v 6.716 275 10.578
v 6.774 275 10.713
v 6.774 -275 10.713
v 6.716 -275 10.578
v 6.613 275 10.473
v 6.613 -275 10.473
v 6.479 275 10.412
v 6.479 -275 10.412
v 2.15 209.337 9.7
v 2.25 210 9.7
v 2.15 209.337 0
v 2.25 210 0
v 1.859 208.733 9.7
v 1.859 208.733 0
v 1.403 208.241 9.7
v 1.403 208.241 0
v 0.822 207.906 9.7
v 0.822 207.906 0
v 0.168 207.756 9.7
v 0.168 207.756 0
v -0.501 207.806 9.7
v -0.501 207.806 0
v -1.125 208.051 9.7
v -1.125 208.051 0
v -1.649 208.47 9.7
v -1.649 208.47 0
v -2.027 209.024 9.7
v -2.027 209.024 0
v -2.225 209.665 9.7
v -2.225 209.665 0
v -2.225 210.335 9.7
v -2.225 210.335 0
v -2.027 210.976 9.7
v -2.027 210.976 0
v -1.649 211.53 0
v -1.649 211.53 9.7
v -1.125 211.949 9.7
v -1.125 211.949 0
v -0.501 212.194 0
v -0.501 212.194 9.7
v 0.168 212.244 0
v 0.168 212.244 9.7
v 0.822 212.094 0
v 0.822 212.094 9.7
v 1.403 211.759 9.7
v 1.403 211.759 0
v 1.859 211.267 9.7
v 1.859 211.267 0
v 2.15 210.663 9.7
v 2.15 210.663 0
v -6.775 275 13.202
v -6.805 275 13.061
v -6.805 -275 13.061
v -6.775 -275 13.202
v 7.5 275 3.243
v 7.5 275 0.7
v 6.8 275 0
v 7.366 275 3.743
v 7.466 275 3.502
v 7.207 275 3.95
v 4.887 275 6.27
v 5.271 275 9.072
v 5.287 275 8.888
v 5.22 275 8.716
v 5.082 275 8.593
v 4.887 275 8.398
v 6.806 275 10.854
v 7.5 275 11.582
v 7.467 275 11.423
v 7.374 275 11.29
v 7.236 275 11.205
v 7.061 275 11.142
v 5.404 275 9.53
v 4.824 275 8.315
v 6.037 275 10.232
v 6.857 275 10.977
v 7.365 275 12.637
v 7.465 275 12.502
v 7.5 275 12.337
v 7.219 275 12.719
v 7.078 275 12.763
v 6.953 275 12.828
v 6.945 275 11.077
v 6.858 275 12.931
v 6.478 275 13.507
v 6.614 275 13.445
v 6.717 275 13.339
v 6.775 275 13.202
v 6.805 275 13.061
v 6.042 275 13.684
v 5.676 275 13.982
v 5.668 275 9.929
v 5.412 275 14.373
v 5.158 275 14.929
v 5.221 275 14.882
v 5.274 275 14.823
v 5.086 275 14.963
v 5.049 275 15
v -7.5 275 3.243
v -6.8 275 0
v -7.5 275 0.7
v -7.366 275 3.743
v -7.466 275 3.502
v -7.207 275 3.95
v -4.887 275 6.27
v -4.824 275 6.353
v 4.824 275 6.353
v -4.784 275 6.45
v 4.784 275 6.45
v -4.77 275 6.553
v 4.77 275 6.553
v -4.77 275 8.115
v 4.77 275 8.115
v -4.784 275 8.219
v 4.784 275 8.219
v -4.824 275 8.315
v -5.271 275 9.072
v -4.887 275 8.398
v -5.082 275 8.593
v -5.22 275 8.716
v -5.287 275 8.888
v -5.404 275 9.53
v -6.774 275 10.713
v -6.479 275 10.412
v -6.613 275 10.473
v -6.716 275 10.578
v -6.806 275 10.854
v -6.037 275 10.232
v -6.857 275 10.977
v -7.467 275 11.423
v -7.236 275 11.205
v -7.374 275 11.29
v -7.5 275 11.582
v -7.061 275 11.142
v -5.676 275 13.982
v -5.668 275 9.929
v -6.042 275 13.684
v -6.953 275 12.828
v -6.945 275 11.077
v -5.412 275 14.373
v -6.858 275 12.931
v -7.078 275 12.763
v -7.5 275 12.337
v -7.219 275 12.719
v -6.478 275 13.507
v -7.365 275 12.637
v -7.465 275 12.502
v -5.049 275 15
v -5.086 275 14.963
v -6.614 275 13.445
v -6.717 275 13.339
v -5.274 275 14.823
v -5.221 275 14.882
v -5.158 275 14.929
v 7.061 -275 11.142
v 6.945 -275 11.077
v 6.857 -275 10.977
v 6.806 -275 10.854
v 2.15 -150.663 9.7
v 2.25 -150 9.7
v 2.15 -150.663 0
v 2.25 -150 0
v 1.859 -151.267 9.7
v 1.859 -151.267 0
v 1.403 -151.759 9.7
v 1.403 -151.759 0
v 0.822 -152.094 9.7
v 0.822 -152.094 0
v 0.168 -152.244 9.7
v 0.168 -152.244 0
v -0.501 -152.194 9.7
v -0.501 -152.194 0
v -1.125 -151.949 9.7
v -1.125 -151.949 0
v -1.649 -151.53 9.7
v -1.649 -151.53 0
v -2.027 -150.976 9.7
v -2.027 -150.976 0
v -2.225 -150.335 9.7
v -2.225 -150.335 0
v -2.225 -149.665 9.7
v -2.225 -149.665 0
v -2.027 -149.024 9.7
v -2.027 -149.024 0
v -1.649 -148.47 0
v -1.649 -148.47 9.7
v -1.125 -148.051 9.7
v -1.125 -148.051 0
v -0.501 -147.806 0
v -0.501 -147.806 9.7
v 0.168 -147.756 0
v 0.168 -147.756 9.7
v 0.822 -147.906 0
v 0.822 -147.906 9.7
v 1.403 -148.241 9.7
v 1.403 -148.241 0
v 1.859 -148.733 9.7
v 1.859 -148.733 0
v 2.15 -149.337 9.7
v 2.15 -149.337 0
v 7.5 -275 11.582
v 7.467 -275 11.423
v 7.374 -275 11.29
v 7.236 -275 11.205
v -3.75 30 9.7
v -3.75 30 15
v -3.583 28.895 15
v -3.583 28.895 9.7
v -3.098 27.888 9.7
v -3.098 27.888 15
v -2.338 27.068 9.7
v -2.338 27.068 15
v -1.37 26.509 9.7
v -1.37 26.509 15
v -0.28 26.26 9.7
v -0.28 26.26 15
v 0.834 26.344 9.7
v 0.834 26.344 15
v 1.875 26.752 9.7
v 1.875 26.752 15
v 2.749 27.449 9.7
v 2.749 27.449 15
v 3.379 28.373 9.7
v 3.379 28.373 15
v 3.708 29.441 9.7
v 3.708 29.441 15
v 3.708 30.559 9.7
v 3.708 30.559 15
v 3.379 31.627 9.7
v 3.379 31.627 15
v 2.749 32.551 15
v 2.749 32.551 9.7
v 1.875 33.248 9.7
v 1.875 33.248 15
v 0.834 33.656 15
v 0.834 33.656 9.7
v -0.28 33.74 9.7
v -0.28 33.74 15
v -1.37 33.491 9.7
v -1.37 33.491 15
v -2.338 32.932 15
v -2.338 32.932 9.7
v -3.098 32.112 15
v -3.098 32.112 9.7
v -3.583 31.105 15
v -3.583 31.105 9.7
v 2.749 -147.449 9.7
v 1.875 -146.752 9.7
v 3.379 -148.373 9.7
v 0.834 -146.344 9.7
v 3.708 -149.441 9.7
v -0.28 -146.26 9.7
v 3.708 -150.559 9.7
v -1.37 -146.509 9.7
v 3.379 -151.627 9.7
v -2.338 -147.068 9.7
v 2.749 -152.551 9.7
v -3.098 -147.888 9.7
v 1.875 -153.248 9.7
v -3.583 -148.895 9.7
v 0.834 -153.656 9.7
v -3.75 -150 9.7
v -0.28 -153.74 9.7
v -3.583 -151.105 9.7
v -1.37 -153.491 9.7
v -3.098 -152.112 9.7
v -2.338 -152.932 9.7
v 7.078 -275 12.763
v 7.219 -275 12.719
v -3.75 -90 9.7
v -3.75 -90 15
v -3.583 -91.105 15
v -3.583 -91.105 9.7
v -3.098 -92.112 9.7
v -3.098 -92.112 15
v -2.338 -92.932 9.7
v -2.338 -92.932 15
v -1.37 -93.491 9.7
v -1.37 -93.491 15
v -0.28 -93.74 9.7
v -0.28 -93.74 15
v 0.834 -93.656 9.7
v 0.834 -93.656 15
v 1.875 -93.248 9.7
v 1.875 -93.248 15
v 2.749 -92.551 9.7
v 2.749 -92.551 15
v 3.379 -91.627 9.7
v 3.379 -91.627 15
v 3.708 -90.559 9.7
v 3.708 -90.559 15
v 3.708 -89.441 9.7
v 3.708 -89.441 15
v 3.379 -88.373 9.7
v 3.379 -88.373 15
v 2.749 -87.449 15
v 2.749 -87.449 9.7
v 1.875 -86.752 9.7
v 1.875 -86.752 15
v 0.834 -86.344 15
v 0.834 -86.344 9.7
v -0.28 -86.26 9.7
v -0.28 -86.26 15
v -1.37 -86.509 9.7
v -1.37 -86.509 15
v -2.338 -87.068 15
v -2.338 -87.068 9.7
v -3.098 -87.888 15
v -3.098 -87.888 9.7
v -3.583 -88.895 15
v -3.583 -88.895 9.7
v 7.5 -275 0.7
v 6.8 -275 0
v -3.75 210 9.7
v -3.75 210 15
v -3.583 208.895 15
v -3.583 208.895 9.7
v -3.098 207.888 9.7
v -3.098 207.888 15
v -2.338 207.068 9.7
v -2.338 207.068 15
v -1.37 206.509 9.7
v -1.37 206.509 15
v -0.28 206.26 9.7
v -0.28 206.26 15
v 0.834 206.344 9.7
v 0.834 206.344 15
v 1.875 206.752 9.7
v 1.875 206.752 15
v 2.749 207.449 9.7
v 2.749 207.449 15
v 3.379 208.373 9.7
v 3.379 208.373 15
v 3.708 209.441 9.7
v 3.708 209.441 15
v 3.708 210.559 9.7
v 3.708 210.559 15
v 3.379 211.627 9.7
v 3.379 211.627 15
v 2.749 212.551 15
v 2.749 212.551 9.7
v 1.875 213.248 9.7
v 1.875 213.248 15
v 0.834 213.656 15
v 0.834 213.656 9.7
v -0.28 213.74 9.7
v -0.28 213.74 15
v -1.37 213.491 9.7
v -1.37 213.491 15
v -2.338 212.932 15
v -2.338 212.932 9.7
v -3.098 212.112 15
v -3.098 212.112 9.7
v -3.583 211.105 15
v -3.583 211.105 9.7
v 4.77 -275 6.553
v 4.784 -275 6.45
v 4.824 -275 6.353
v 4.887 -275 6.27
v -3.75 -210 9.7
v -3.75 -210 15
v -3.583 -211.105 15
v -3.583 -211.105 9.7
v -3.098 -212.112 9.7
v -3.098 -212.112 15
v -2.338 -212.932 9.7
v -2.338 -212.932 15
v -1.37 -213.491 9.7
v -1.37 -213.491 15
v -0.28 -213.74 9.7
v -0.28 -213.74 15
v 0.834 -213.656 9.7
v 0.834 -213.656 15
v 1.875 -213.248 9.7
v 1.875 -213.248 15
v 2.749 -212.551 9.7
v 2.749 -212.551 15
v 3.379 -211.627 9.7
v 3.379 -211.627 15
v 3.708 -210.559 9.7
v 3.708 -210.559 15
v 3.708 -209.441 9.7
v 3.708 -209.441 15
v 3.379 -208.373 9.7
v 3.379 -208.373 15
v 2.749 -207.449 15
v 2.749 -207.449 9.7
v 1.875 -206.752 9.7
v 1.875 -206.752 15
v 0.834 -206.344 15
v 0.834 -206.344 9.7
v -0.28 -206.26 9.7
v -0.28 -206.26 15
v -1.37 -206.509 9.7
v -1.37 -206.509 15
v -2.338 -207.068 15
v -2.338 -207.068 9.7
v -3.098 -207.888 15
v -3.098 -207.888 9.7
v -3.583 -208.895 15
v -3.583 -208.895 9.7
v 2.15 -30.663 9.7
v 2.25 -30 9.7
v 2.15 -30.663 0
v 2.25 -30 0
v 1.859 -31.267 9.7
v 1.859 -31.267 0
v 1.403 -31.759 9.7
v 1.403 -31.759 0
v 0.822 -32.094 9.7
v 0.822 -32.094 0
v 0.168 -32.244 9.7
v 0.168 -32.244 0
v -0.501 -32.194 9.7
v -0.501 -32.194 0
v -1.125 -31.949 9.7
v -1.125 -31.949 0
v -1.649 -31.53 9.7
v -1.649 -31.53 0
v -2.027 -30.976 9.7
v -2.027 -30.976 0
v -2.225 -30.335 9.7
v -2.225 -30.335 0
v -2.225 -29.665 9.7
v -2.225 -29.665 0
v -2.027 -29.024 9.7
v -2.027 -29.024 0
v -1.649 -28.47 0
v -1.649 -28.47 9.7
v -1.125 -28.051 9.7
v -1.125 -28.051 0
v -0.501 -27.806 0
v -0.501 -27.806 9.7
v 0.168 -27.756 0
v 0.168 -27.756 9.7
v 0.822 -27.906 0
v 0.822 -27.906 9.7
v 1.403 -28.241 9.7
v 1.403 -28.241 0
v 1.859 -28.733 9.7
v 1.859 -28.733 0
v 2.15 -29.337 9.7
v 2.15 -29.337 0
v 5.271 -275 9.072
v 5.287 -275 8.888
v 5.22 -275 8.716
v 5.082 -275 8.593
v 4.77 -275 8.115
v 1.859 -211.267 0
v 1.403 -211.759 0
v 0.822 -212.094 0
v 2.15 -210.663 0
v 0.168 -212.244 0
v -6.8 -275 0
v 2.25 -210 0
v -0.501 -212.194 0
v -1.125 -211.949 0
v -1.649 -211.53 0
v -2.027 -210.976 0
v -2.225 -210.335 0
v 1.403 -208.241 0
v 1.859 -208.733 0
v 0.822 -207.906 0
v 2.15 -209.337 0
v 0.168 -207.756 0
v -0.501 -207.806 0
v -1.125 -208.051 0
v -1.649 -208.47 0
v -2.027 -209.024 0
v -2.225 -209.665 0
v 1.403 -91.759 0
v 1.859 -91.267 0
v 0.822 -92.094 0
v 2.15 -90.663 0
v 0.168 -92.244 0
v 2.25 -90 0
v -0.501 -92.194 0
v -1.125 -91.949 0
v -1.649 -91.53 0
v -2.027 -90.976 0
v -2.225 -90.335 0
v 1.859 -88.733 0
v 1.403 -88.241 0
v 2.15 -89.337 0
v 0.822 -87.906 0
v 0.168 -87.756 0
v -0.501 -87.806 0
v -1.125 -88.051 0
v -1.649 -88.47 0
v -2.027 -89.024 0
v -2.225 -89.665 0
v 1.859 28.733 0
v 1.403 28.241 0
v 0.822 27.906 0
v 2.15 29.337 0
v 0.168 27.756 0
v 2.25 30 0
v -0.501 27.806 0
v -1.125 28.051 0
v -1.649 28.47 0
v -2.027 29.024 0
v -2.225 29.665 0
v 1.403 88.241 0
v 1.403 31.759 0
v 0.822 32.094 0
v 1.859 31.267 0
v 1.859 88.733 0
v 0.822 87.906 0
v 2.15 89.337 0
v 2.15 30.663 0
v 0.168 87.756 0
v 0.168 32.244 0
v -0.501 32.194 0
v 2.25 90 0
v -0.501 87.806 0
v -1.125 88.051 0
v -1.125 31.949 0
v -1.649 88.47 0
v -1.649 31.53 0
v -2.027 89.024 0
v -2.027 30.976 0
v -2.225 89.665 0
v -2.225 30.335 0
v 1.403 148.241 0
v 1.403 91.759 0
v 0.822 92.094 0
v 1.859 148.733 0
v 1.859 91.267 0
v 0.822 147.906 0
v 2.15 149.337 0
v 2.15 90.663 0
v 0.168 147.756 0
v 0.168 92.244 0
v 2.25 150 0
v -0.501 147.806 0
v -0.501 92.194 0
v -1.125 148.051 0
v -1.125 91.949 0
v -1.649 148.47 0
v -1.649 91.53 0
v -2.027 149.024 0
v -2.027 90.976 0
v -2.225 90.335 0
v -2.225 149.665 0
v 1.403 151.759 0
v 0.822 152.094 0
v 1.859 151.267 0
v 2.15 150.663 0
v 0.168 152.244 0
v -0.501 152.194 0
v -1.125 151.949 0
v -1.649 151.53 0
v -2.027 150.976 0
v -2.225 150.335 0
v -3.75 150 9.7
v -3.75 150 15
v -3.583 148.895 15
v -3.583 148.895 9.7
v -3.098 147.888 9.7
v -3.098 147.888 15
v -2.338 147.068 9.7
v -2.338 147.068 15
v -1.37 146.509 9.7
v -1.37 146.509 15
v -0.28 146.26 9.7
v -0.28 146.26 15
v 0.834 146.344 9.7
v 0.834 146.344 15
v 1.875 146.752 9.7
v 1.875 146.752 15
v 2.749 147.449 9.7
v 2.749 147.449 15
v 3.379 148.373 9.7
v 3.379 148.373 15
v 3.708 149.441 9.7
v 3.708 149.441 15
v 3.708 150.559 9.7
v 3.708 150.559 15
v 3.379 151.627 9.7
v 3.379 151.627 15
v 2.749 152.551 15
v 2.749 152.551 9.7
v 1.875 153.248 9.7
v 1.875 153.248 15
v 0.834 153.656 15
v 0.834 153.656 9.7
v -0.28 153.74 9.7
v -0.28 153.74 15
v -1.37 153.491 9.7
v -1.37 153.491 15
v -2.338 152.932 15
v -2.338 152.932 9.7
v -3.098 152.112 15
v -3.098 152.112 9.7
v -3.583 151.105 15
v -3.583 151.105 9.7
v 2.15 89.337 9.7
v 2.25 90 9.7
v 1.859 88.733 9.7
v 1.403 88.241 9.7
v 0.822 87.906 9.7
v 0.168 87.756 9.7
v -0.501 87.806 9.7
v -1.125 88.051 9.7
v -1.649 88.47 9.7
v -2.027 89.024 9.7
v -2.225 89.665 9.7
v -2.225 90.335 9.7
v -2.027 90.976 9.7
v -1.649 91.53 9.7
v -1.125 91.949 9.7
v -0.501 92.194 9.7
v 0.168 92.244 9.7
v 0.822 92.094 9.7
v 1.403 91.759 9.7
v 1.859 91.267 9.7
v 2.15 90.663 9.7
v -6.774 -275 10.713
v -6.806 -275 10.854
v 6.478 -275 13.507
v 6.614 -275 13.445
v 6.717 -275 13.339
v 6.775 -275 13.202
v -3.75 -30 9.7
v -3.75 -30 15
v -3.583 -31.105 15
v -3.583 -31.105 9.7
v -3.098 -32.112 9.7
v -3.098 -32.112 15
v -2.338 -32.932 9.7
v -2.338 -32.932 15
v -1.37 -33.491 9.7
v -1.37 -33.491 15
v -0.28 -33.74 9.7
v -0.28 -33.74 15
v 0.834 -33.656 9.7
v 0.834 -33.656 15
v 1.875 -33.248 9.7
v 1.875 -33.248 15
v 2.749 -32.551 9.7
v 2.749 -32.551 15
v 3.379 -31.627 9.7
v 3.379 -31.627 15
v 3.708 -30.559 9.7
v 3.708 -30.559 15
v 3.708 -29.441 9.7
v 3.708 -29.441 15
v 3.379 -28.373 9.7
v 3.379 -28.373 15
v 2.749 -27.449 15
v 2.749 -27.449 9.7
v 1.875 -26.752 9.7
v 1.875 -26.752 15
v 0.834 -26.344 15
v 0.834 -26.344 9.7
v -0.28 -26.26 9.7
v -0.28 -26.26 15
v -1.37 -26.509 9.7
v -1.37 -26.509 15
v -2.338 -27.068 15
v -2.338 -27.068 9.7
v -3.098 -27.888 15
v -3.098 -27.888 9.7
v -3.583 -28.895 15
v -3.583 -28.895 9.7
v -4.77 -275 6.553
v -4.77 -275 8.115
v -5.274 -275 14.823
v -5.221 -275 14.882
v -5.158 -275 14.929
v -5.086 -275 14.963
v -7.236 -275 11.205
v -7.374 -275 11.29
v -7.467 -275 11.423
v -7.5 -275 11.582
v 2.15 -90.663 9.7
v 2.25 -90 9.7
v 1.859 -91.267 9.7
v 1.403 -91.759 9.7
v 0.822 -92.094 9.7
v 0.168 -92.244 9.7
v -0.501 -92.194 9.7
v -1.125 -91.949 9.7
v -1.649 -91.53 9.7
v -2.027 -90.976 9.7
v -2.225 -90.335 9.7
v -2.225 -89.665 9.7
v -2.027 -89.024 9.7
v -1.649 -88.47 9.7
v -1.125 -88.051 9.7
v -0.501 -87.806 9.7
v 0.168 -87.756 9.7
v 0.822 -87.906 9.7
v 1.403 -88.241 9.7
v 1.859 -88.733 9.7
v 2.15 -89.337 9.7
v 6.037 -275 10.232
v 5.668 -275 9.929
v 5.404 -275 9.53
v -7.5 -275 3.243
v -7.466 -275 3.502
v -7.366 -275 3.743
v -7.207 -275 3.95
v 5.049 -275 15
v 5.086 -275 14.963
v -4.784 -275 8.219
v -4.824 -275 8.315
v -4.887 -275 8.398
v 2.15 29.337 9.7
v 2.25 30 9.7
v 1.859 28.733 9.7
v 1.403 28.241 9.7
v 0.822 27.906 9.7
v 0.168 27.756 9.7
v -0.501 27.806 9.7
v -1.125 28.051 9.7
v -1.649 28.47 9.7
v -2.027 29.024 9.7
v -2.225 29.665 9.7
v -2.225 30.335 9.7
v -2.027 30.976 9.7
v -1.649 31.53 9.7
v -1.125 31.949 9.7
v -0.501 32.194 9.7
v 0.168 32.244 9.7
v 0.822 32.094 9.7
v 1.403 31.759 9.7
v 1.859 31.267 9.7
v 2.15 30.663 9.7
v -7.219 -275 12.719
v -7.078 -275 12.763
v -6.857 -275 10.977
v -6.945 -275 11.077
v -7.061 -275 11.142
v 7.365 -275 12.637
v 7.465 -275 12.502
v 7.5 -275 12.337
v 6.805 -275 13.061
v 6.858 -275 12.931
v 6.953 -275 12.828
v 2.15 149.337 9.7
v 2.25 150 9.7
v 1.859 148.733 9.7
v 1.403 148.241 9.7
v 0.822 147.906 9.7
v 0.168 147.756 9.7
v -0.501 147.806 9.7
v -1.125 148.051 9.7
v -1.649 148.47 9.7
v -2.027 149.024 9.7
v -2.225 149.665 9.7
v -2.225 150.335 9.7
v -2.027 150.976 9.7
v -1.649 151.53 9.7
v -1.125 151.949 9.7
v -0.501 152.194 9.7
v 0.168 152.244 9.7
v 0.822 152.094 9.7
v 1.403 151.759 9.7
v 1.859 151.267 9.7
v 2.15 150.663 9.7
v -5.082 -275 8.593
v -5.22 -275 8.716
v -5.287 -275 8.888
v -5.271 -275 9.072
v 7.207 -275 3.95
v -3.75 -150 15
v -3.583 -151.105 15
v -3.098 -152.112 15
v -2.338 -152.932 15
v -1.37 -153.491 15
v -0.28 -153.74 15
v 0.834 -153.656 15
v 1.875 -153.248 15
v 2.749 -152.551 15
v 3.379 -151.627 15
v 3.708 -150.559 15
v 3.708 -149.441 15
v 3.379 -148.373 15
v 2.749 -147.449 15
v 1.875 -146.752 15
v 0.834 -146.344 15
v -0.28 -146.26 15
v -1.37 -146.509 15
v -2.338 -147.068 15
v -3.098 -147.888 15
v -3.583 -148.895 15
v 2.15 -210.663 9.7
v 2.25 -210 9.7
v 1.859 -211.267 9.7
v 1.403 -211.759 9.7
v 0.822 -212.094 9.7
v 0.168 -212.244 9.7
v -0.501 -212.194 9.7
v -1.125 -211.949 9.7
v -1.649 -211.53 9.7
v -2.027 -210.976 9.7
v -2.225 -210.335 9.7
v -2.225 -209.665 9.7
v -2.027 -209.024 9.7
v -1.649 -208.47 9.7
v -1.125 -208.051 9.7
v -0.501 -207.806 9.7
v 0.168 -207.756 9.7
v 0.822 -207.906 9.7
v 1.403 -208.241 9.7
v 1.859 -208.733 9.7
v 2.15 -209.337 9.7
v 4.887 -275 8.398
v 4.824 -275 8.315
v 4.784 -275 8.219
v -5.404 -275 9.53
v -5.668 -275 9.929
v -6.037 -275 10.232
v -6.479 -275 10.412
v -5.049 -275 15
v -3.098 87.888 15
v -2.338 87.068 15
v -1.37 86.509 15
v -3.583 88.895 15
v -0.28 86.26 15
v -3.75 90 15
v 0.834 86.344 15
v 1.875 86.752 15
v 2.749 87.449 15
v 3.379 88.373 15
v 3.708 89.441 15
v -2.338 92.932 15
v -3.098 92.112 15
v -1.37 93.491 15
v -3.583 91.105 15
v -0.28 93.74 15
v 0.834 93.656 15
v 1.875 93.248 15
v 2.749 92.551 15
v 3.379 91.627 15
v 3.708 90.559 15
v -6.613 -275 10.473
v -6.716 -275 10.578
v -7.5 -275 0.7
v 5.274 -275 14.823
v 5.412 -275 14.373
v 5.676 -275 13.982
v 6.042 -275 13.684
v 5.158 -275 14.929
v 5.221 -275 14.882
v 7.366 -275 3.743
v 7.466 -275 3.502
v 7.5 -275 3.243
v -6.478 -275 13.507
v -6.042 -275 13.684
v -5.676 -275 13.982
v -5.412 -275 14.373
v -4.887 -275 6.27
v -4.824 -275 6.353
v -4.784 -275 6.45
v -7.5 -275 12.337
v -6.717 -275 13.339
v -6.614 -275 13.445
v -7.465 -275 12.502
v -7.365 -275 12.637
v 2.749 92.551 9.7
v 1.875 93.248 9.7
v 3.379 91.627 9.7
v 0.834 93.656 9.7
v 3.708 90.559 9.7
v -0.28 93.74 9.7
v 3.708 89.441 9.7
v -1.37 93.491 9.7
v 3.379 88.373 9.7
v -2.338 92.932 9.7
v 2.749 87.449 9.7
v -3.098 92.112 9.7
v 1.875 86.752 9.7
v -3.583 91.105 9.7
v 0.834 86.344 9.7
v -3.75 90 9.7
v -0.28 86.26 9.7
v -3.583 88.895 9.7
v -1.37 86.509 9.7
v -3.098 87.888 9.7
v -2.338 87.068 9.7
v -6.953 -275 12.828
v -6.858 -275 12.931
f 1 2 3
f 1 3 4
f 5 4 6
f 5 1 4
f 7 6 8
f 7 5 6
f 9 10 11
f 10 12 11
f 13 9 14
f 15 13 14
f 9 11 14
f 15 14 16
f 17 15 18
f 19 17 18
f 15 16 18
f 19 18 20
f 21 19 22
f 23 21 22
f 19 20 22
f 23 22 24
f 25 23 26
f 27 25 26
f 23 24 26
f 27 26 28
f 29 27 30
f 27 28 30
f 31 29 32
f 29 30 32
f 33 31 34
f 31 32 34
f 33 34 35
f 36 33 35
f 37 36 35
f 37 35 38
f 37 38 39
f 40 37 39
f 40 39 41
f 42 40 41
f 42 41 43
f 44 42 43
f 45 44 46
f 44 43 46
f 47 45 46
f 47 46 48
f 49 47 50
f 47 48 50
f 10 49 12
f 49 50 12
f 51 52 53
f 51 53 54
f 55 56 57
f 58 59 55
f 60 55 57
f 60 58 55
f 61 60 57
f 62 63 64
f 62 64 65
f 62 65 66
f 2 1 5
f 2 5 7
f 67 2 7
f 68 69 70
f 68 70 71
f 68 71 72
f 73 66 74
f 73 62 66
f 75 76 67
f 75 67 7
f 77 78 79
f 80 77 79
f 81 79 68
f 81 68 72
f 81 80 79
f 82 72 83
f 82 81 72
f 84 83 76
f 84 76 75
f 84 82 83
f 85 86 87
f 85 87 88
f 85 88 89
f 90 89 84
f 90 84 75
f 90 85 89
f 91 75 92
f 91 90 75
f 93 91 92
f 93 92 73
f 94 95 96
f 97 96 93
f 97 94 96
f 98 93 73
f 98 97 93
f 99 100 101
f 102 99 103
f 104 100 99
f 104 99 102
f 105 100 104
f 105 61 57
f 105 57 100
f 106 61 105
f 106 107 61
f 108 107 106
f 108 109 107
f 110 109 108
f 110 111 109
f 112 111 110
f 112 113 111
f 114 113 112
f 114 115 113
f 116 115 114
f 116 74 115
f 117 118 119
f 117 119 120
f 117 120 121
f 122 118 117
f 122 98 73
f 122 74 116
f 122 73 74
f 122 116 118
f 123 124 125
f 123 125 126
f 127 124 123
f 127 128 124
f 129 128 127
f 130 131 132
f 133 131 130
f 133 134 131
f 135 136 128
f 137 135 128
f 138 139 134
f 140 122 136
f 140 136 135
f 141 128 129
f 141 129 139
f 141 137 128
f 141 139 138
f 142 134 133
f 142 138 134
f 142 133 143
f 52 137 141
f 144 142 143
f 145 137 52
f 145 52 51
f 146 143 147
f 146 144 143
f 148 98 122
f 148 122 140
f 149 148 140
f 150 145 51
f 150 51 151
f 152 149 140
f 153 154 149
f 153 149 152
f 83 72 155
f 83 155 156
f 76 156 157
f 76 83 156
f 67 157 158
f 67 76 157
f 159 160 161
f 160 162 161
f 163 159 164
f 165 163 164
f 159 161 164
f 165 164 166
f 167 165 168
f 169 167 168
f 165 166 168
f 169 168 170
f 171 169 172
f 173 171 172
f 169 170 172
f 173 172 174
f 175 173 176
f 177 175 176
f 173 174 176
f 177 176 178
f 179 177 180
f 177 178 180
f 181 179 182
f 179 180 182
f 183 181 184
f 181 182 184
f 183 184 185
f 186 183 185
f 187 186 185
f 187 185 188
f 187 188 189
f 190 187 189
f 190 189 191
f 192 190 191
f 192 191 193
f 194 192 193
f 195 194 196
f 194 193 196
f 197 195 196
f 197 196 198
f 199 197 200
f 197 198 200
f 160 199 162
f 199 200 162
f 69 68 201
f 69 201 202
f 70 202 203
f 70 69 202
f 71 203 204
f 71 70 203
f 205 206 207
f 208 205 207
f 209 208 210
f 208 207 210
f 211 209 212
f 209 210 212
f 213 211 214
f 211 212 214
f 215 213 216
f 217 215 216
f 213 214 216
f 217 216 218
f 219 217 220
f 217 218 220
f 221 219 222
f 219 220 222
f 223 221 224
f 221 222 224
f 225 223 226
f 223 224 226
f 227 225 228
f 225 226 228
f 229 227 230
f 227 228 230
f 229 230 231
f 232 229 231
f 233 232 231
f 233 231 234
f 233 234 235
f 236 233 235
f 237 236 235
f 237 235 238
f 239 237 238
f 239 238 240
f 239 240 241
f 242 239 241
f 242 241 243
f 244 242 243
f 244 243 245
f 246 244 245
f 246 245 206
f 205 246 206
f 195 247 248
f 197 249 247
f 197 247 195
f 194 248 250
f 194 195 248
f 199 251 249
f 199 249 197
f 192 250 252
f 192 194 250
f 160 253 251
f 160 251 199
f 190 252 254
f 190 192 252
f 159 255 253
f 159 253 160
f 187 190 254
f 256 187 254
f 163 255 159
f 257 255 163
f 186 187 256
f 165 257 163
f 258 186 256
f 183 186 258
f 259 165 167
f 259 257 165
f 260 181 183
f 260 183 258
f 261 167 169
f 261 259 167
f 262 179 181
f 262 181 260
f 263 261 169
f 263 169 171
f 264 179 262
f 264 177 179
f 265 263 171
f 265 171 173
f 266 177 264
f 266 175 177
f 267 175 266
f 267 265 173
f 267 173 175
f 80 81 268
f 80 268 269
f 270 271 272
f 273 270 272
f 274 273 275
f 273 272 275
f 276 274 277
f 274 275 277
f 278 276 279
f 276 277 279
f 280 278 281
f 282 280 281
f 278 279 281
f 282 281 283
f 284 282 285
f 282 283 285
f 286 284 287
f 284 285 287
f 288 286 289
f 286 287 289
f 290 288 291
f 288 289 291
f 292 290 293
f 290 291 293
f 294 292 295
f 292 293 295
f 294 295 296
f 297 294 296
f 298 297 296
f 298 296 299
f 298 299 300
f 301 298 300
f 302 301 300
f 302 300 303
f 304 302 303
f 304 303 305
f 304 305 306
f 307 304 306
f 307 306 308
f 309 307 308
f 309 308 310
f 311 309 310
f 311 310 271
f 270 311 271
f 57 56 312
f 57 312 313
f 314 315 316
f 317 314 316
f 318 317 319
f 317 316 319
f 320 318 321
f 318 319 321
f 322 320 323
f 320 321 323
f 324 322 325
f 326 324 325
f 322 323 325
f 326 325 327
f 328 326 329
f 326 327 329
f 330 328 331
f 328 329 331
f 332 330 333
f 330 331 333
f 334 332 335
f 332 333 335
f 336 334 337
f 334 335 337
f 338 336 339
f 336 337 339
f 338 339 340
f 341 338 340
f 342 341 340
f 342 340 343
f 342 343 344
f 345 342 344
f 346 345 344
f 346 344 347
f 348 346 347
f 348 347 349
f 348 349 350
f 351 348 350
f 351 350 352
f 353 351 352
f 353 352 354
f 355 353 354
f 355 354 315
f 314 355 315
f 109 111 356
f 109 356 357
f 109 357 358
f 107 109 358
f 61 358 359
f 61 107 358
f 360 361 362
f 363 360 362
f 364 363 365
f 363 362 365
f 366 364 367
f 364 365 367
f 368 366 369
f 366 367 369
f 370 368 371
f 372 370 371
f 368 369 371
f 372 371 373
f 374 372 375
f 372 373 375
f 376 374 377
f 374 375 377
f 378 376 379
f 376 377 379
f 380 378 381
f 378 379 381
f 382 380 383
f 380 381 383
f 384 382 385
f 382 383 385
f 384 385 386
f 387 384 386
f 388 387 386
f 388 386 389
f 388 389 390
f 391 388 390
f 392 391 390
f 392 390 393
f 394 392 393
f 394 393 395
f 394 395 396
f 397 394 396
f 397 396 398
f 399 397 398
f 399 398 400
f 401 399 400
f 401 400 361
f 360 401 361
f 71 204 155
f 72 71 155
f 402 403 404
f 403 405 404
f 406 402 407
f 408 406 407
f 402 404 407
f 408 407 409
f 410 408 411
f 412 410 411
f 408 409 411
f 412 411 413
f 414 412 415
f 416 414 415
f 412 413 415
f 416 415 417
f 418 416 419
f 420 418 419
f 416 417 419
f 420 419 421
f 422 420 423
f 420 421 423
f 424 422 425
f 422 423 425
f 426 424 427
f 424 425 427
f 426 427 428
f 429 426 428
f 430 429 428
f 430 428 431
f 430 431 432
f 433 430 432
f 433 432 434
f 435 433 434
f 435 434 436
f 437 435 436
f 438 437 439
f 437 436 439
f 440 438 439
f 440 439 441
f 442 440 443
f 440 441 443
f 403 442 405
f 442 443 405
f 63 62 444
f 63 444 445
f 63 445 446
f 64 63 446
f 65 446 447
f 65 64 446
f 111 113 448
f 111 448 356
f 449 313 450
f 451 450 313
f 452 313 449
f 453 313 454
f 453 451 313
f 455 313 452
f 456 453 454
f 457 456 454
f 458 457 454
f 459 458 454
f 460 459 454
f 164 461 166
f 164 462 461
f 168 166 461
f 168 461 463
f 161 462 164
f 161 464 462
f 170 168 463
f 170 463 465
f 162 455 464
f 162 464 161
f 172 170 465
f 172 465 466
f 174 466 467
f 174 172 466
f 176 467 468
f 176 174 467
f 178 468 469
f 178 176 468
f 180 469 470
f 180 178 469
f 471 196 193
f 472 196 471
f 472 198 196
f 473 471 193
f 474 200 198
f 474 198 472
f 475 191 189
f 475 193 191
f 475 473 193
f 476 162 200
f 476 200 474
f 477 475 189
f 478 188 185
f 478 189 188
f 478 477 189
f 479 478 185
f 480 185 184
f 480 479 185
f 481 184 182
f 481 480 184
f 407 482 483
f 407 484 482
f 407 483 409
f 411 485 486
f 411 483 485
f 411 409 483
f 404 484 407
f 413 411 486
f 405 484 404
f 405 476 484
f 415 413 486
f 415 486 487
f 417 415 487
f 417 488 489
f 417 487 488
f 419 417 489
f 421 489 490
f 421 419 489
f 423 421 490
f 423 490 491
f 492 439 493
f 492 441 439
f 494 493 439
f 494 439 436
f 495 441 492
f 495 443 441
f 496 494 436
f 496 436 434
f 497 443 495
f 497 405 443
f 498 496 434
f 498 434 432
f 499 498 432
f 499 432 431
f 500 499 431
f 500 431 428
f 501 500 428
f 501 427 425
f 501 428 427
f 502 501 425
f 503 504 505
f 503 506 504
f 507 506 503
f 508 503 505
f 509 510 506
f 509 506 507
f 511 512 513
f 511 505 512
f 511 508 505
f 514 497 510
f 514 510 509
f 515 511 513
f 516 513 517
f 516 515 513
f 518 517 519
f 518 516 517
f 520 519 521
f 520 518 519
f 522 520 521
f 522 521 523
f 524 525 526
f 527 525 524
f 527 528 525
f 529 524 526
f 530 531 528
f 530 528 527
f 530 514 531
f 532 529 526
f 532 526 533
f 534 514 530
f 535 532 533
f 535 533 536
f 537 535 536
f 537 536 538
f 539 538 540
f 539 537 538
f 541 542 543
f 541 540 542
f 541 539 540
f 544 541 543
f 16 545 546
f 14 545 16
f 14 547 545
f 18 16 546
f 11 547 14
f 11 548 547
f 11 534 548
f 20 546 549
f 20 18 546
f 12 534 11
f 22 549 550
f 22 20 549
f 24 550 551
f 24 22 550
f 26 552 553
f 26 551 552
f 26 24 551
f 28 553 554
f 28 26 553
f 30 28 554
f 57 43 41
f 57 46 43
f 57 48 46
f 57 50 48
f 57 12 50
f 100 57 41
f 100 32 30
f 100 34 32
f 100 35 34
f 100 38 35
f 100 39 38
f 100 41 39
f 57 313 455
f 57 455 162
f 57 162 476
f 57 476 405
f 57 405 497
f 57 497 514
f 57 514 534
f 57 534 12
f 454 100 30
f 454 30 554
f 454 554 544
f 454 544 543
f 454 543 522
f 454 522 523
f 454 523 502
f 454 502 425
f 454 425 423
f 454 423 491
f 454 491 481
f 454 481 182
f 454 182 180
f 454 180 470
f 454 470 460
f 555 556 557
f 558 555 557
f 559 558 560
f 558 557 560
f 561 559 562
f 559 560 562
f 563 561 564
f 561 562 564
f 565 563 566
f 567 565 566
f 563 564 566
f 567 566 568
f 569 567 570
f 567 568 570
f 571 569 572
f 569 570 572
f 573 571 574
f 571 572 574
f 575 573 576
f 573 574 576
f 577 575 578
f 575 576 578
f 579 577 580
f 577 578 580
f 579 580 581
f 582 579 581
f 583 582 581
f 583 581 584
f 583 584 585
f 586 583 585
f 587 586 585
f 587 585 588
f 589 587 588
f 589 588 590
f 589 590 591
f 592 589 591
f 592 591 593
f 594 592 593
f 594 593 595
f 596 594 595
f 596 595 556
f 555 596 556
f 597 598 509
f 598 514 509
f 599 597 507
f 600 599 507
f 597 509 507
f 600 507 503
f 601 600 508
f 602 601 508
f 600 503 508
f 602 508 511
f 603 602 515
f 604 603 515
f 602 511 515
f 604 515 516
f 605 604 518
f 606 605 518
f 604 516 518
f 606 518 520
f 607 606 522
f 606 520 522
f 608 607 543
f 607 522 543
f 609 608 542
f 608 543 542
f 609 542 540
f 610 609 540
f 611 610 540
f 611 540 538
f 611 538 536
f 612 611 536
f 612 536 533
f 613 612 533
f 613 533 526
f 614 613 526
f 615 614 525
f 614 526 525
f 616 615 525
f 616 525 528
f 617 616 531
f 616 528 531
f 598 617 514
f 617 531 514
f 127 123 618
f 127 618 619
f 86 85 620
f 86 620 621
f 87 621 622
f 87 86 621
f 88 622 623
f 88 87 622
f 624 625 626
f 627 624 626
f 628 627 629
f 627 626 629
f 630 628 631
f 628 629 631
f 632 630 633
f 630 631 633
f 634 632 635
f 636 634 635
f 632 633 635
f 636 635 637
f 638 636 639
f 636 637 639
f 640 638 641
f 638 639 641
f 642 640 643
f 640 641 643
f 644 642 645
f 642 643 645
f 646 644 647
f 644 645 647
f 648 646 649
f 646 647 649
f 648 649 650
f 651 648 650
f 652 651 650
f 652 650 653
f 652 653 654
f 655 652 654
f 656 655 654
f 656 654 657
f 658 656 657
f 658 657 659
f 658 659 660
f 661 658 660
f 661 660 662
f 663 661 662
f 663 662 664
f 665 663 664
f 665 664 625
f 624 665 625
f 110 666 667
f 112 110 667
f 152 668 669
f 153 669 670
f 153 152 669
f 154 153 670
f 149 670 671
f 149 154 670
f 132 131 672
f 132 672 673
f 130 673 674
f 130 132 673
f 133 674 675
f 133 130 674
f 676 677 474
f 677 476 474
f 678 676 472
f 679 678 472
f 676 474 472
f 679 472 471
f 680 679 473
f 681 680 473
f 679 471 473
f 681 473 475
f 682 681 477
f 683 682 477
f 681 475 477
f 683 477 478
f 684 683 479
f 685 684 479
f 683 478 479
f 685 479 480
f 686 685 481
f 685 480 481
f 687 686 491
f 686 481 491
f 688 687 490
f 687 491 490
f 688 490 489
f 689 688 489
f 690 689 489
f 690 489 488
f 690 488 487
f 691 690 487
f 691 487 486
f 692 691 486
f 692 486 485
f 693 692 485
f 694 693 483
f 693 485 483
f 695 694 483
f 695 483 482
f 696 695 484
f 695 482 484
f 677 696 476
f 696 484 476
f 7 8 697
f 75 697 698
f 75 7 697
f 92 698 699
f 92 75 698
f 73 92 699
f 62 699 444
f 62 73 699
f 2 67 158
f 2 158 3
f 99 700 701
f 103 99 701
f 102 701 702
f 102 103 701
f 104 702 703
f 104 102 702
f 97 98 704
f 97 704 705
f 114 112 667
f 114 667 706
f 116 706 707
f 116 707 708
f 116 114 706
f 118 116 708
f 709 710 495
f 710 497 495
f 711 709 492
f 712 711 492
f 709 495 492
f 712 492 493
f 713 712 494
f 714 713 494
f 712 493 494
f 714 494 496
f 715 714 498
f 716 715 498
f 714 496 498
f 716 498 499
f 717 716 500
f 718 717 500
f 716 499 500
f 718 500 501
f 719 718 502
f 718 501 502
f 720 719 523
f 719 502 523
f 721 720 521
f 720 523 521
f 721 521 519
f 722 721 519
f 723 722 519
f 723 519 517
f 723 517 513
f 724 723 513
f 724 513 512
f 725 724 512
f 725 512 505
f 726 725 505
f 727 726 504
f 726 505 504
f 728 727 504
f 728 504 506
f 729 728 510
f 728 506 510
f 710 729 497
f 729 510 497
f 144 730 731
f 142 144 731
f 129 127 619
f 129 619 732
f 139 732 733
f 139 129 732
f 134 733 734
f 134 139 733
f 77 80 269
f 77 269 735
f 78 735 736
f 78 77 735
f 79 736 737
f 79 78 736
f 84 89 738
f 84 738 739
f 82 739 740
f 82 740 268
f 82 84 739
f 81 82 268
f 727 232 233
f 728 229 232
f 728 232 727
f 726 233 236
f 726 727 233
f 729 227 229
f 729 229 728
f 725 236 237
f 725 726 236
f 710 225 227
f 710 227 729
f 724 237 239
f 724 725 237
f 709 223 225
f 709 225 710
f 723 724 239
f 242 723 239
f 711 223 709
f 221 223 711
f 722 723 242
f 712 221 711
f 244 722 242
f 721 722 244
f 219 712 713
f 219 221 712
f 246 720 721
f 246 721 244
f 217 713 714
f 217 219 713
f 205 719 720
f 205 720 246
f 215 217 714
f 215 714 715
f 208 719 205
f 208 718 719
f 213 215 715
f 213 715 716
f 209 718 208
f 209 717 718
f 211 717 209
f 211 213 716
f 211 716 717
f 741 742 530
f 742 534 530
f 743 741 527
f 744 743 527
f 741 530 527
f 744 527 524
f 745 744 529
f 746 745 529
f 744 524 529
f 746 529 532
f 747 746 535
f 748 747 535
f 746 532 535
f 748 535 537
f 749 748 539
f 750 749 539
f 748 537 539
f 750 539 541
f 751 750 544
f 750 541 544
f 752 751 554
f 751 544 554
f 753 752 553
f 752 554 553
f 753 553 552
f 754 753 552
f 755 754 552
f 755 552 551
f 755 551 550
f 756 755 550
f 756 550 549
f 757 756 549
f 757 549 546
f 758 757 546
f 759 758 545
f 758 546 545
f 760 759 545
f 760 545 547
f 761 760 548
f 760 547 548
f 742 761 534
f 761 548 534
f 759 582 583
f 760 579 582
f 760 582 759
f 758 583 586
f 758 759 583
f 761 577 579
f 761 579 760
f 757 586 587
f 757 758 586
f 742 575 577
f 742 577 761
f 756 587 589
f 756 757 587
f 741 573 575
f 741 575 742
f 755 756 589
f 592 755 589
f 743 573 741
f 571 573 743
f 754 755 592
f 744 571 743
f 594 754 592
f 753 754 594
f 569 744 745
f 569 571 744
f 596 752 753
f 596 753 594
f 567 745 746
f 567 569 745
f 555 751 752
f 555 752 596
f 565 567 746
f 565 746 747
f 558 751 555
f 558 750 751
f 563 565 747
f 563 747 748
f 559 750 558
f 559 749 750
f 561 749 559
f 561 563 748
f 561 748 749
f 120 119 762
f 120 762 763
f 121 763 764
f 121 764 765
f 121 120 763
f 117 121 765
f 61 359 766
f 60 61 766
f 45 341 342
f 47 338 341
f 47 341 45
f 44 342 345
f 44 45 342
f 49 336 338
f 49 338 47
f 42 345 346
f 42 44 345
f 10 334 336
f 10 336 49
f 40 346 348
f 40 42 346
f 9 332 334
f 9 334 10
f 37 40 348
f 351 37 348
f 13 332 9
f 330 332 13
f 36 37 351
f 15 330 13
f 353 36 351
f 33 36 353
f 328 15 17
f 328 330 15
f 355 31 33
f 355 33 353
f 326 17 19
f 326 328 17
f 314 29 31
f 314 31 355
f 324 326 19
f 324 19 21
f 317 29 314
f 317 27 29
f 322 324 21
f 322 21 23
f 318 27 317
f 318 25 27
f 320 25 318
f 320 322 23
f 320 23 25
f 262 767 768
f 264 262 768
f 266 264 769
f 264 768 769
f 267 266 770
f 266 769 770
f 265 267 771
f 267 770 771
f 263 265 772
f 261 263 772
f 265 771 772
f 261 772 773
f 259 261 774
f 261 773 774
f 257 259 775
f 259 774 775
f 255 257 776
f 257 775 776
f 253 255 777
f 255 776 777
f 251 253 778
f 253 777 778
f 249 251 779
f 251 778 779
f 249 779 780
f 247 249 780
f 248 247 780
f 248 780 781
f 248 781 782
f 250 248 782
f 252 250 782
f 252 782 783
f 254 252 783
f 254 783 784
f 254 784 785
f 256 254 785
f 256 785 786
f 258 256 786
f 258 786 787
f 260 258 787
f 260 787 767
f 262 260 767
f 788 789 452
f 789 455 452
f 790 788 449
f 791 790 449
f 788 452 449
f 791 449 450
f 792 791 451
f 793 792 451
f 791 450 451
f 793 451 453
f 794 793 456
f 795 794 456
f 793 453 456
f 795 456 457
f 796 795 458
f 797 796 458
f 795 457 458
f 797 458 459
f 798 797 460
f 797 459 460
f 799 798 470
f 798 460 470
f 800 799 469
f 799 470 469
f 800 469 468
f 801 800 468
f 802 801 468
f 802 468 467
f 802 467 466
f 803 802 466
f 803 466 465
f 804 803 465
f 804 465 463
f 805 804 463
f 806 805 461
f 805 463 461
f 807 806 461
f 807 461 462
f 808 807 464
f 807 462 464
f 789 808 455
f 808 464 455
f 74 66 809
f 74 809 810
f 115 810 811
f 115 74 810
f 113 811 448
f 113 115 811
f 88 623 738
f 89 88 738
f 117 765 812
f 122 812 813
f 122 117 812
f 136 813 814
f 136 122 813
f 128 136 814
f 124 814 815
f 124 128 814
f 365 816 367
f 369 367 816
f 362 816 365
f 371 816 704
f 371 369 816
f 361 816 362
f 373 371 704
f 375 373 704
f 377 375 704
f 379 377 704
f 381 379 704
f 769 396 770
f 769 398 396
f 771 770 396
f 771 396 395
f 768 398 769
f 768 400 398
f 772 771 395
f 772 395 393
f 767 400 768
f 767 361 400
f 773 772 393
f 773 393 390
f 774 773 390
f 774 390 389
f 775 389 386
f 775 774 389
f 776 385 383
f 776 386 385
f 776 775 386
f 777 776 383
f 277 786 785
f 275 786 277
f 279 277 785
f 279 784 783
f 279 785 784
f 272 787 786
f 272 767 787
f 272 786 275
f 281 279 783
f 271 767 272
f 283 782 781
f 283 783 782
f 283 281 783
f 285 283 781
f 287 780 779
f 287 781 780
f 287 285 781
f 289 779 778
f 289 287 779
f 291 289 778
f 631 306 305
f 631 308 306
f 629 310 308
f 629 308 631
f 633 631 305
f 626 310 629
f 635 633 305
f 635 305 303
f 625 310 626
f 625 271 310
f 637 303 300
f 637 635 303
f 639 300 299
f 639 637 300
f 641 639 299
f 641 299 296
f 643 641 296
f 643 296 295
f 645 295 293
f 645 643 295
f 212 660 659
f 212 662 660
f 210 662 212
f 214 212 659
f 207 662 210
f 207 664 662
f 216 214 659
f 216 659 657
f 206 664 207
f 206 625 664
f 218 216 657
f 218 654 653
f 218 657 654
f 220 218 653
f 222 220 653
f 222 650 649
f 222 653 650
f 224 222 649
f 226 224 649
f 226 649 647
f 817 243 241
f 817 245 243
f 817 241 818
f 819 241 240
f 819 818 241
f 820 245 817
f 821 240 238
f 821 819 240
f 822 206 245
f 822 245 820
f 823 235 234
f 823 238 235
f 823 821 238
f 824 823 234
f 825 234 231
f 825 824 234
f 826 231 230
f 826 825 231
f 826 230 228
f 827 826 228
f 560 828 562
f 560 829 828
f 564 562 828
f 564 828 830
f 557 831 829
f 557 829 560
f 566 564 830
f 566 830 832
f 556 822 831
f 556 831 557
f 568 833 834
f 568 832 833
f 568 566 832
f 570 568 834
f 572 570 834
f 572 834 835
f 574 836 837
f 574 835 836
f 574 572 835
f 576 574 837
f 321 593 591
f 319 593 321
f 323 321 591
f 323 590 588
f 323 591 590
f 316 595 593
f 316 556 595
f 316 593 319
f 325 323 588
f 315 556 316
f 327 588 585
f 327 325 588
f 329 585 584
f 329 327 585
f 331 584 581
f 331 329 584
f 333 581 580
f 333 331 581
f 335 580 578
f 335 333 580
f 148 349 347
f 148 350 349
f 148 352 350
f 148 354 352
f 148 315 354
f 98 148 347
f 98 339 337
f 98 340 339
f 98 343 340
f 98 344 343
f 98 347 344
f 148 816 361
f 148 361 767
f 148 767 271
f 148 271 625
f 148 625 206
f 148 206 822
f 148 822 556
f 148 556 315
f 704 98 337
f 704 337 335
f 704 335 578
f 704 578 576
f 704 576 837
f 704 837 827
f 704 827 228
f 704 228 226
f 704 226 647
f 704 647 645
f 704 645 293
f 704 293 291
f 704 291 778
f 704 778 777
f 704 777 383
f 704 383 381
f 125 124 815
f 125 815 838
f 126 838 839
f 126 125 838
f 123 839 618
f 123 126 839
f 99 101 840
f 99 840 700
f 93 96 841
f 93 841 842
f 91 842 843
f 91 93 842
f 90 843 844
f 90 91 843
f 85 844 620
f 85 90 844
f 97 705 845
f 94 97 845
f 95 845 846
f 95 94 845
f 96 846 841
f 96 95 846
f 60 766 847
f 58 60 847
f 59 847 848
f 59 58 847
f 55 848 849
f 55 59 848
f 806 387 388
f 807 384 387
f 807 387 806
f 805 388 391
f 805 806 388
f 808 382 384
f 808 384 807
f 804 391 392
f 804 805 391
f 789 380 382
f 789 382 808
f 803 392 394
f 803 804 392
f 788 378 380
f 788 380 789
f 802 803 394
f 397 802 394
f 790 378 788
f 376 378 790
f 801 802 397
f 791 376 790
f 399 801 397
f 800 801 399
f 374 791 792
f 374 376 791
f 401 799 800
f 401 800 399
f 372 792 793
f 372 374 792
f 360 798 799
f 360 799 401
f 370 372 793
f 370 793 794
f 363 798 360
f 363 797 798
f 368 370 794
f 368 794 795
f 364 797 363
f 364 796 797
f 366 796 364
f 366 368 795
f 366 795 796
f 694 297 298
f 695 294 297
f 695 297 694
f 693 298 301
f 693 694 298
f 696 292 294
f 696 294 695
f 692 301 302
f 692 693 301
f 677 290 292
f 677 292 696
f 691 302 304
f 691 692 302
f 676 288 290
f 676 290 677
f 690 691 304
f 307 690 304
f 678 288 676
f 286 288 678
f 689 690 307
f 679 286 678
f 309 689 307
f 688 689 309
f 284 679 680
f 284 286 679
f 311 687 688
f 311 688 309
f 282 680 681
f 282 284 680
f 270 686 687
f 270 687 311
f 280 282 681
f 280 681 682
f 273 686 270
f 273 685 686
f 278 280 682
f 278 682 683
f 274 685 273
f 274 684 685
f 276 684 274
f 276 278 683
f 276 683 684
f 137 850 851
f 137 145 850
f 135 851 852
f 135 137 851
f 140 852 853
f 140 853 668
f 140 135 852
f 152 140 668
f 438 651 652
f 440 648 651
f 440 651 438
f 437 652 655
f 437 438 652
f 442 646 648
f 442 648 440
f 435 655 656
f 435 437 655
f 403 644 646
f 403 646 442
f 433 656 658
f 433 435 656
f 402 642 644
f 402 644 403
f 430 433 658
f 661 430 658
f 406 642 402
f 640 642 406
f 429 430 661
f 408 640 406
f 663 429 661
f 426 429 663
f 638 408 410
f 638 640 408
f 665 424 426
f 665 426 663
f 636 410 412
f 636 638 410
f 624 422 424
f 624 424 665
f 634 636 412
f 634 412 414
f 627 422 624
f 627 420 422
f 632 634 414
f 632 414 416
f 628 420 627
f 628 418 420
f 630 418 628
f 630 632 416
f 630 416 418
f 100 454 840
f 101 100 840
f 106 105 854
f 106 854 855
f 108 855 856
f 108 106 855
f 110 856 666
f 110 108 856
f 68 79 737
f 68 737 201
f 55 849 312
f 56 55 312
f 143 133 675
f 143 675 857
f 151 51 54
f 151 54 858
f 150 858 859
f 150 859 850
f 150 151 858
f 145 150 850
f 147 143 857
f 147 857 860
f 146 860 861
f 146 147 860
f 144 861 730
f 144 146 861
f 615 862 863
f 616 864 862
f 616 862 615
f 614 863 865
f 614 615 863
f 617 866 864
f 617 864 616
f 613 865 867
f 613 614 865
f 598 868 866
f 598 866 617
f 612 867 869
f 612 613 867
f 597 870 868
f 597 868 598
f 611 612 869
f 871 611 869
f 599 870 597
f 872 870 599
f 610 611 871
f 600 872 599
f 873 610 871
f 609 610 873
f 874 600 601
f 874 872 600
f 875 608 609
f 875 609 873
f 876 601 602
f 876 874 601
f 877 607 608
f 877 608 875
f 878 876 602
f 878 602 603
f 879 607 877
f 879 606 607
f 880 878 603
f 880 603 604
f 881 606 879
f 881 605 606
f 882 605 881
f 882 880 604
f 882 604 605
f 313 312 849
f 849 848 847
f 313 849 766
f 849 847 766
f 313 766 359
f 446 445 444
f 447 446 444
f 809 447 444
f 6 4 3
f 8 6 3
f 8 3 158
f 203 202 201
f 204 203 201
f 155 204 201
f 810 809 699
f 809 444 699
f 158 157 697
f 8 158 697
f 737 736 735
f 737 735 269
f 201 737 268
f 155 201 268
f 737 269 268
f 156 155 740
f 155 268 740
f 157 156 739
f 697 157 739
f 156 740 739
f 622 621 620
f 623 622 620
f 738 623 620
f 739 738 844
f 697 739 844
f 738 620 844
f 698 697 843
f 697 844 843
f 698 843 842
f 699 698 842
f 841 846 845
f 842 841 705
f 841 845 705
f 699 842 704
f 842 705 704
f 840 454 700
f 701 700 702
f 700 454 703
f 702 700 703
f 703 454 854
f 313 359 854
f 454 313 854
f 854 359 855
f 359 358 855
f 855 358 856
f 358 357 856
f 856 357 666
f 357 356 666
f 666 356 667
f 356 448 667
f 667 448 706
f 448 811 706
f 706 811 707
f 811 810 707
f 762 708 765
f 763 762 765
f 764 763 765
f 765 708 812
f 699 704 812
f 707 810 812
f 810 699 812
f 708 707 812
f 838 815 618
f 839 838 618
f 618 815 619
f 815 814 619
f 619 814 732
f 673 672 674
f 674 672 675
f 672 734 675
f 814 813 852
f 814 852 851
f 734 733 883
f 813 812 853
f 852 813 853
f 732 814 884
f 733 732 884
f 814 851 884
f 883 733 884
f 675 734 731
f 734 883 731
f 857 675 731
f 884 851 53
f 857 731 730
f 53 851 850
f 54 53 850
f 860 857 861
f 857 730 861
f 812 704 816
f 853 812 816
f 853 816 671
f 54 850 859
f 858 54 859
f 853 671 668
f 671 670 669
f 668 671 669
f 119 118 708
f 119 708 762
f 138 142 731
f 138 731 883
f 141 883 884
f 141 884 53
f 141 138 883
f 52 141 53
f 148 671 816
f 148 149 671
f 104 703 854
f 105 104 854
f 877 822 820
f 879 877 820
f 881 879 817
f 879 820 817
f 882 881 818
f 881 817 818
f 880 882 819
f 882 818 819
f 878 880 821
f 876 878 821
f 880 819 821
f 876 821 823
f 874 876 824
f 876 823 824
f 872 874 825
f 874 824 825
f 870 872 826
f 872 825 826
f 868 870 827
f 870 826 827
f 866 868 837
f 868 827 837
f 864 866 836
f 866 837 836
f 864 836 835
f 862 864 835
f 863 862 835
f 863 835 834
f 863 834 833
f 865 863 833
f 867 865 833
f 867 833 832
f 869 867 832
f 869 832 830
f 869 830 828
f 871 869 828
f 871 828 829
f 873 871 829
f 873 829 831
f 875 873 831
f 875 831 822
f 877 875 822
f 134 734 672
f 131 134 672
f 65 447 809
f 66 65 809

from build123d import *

# Parameters (mm, degrees)
AUFSATZ_LINEAR_AUSTRAGEN2_DEPTH                      = 275
STIRNSENKUNG_F_R_M4_ZYLINDERSCHRAUBE_MIT_D           = 4.5
STIRNSENKUNG_F_R_M4_ZYLINDERSCHRAUBE_MIT_CBORE_D     = 7.5
STIRNSENKUNG_F_R_M4_ZYLINDERSCHRAUBE_MIT_CBORE_DEPTH = 5.3
LINEARES_MUSTER1_COUNT                               = 5
LINEARES_MUSTER1_PITCH                               = 60
LINEARES_MUSTER1_COL_COUNT                           = 4
LINEARES_MUSTER1_COL_PITCH                           = 60


with BuildPart() as part:
    # Skizze20 → Aufsatz-Linear austragen2 (new body, symmetric)
    with BuildSketch(Plane(origin=(0, 0, 0), x_dir=(-1, 0, 0), z_dir=(0, 1, 0))):
        with BuildLine():
            Line((5.086058415, 14.962936516), (5.048994965, 14.999999966))
            Line((5.048994965, 14.999999966), (-5.048994935, 14.999999966))
            Line((-5.048994935, 14.999999966), (-5.086058385, 14.962936516))
            ThreePointArc((-5.086058385, 14.962936516), (-5.190484939, 14.907225244), (-5.274036713, 14.823393555))
            ThreePointArc((-5.274036713, 14.823393555), (-5.675619489, 13.981556013), (-6.478406056, 13.506695083))
            ThreePointArc((-6.478406056, 13.506695083), (-6.670526117, 13.397067183), (-6.775010631, 13.202102106))
            Line((-6.775010631, 13.202102106), (-6.80531374, 13.061185574))
            ThreePointArc((-6.80531374, 13.061185574), (-6.901163586, 12.875371344), (-7.077668811, 12.763299819))
            Line((-7.077668811, 12.763299819), (-7.218705101, 12.719471058))
            ThreePointArc((-7.218705101, 12.719471058), (-7.422088515, 12.574680309), (-7.49999998, 12.337490558))
            Line((-7.49999998, 12.337490558), (-7.49999998, 11.58151164))
            ThreePointArc((-7.49999998, 11.58151164), (-7.427329884, 11.351609192), (-7.23572431, 11.205241905))
            Line((-7.23572431, 11.205241905), (-7.060649561, 11.142090651))
            ThreePointArc((-7.060649561, 11.142090651), (-6.896592739, 11.030643995), (-6.806235234, 10.854092247))
            Line((-6.806235234, 10.854092247), (-6.774259003, 10.712764773))
            ThreePointArc((-6.774259003, 10.712764773), (-6.669188305, 10.520436279), (-6.47854359, 10.412340517))
            ThreePointArc((-6.47854359, 10.412340517), (-5.667573181, 9.928576079), (-5.270638873, 9.071753932))
            ThreePointArc((-5.270638873, 9.071753932), (-5.263507905, 8.797692466), (-5.081588111, 8.592593158))
            Line((-5.081588111, 8.592593158), (-4.887157216, 8.398162262))
            ThreePointArc((-4.887157216, 8.398162262), (-4.800448112, 8.268392918), (-4.769999924, 8.11531954))
            Line((-4.769999924, 8.11531954), (-4.769999924, 6.55325896))
            ThreePointArc((-4.769999924, 6.55325896), (-4.800448112, 6.400185582), (-4.887157216, 6.270416238))
            Line((-4.887157216, 6.270416238), (-7.207106753, 3.950466701))
            ThreePointArc((-7.207106753, 3.950466701), (-7.42387951, 3.626043343), (-7.49999998, 3.2433599))
            Line((-7.49999998, 3.2433599), (-7.49999998, 0.700000002))
            Line((-7.49999998, 0.700000002), (-6.800000016, 0))
            Line((-6.800000016, 0), (6.800000018, 0))
            Line((6.800000018, 0), (7.5, 0.699999983))
            Line((7.5, 0.699999983), (7.5, 3.24335988))
            ThreePointArc((7.5, 3.24335988), (7.423879531, 3.626043323), (7.207106773, 3.950466681))
            Line((7.207106773, 3.950466681), (4.887157237, 6.270416218))
            ThreePointArc((4.887157237, 6.270416218), (4.800448133, 6.400185562), (4.769999945, 6.553258941))
            Line((4.769999945, 6.553258941), (4.769999945, 8.11531952))
            ThreePointArc((4.769999945, 8.11531952), (4.800448133, 8.268392899), (4.887157237, 8.398162243))
            Line((4.887157237, 8.398162243), (5.081588132, 8.592593138))
            ThreePointArc((5.081588132, 8.592593138), (5.263507933, 8.797692455), (5.270638894, 9.071753931))
            ThreePointArc((5.270638894, 9.071753931), (5.667573202, 9.928576078), (6.478543611, 10.412340516))
            ThreePointArc((6.478543611, 10.412340516), (6.669188326, 10.520436278), (6.774259024, 10.712764772))
            Line((6.774259024, 10.712764772), (6.806235255, 10.854092246))
            ThreePointArc((6.806235255, 10.854092246), (6.89659276, 11.030643993), (7.060649582, 11.14209065))
            Line((7.060649582, 11.14209065), (7.235724331, 11.205241904))
            ThreePointArc((7.235724331, 11.205241904), (7.427329905, 11.351609191), (7.5, 11.581511639))
            Line((7.5, 11.581511639), (7.5, 12.337490557))
            ThreePointArc((7.5, 12.337490557), (7.422088535, 12.574680307), (7.218705121, 12.719471057))
            Line((7.218705121, 12.719471057), (7.077668832, 12.763299817))
            ThreePointArc((7.077668832, 12.763299817), (6.901163607, 12.875371342), (6.805313761, 13.061185572))
            Line((6.805313761, 13.061185572), (6.775010652, 13.202102105))
            ThreePointArc((6.775010652, 13.202102105), (6.670526139, 13.39706718), (6.478406079, 13.506695081))
            ThreePointArc((6.478406079, 13.506695081), (5.675619515, 13.981556013), (5.274036742, 14.823393555))
            ThreePointArc((5.274036742, 14.823393555), (5.190484969, 14.907225244), (5.086058415, 14.962936516))
        make_face()
    extrude(amount=AUFSATZ_LINEAR_AUSTRAGEN2_DEPTH, both=True)

    # Stirnsenkung für M4 Zylinderschraube mit Innensechskant1 (through all)
    with Locations(Plane(origin=(0, 0, 14.999999966), x_dir=(-1, 0, 0), z_dir=(0, 0, 1))):
        with Locations((1.5e-08, 30)):
            stirnsenkung_f_r_m4_zylinderschraube_mit = CounterBoreHole(STIRNSENKUNG_F_R_M4_ZYLINDERSCHRAUBE_MIT_D / 2, STIRNSENKUNG_F_R_M4_ZYLINDERSCHRAUBE_MIT_CBORE_D / 2, STIRNSENKUNG_F_R_M4_ZYLINDERSCHRAUBE_MIT_CBORE_DEPTH)

    # Lineares Muster1: Stirnsenkung für M4 Zylinderschraube mit Innensechskant1 ×5
    with Locations(*[(0, i * LINEARES_MUSTER1_PITCH, 0) for i in range(1, LINEARES_MUSTER1_COUNT)]):
        add(stirnsenkung_f_r_m4_zylinderschraube_mit, mode=Mode.SUBTRACT)

    # Lineares Muster1 col: Stirnsenkung für M4 Zylinderschraube mit Innensechskant1 ×4
    with Locations(*[(0, -i * LINEARES_MUSTER1_COL_PITCH, 0) for i in range(1, LINEARES_MUSTER1_COL_COUNT)]):
        add(stirnsenkung_f_r_m4_zylinderschraube_mit, mode=Mode.SUBTRACT)


solid = part.part
